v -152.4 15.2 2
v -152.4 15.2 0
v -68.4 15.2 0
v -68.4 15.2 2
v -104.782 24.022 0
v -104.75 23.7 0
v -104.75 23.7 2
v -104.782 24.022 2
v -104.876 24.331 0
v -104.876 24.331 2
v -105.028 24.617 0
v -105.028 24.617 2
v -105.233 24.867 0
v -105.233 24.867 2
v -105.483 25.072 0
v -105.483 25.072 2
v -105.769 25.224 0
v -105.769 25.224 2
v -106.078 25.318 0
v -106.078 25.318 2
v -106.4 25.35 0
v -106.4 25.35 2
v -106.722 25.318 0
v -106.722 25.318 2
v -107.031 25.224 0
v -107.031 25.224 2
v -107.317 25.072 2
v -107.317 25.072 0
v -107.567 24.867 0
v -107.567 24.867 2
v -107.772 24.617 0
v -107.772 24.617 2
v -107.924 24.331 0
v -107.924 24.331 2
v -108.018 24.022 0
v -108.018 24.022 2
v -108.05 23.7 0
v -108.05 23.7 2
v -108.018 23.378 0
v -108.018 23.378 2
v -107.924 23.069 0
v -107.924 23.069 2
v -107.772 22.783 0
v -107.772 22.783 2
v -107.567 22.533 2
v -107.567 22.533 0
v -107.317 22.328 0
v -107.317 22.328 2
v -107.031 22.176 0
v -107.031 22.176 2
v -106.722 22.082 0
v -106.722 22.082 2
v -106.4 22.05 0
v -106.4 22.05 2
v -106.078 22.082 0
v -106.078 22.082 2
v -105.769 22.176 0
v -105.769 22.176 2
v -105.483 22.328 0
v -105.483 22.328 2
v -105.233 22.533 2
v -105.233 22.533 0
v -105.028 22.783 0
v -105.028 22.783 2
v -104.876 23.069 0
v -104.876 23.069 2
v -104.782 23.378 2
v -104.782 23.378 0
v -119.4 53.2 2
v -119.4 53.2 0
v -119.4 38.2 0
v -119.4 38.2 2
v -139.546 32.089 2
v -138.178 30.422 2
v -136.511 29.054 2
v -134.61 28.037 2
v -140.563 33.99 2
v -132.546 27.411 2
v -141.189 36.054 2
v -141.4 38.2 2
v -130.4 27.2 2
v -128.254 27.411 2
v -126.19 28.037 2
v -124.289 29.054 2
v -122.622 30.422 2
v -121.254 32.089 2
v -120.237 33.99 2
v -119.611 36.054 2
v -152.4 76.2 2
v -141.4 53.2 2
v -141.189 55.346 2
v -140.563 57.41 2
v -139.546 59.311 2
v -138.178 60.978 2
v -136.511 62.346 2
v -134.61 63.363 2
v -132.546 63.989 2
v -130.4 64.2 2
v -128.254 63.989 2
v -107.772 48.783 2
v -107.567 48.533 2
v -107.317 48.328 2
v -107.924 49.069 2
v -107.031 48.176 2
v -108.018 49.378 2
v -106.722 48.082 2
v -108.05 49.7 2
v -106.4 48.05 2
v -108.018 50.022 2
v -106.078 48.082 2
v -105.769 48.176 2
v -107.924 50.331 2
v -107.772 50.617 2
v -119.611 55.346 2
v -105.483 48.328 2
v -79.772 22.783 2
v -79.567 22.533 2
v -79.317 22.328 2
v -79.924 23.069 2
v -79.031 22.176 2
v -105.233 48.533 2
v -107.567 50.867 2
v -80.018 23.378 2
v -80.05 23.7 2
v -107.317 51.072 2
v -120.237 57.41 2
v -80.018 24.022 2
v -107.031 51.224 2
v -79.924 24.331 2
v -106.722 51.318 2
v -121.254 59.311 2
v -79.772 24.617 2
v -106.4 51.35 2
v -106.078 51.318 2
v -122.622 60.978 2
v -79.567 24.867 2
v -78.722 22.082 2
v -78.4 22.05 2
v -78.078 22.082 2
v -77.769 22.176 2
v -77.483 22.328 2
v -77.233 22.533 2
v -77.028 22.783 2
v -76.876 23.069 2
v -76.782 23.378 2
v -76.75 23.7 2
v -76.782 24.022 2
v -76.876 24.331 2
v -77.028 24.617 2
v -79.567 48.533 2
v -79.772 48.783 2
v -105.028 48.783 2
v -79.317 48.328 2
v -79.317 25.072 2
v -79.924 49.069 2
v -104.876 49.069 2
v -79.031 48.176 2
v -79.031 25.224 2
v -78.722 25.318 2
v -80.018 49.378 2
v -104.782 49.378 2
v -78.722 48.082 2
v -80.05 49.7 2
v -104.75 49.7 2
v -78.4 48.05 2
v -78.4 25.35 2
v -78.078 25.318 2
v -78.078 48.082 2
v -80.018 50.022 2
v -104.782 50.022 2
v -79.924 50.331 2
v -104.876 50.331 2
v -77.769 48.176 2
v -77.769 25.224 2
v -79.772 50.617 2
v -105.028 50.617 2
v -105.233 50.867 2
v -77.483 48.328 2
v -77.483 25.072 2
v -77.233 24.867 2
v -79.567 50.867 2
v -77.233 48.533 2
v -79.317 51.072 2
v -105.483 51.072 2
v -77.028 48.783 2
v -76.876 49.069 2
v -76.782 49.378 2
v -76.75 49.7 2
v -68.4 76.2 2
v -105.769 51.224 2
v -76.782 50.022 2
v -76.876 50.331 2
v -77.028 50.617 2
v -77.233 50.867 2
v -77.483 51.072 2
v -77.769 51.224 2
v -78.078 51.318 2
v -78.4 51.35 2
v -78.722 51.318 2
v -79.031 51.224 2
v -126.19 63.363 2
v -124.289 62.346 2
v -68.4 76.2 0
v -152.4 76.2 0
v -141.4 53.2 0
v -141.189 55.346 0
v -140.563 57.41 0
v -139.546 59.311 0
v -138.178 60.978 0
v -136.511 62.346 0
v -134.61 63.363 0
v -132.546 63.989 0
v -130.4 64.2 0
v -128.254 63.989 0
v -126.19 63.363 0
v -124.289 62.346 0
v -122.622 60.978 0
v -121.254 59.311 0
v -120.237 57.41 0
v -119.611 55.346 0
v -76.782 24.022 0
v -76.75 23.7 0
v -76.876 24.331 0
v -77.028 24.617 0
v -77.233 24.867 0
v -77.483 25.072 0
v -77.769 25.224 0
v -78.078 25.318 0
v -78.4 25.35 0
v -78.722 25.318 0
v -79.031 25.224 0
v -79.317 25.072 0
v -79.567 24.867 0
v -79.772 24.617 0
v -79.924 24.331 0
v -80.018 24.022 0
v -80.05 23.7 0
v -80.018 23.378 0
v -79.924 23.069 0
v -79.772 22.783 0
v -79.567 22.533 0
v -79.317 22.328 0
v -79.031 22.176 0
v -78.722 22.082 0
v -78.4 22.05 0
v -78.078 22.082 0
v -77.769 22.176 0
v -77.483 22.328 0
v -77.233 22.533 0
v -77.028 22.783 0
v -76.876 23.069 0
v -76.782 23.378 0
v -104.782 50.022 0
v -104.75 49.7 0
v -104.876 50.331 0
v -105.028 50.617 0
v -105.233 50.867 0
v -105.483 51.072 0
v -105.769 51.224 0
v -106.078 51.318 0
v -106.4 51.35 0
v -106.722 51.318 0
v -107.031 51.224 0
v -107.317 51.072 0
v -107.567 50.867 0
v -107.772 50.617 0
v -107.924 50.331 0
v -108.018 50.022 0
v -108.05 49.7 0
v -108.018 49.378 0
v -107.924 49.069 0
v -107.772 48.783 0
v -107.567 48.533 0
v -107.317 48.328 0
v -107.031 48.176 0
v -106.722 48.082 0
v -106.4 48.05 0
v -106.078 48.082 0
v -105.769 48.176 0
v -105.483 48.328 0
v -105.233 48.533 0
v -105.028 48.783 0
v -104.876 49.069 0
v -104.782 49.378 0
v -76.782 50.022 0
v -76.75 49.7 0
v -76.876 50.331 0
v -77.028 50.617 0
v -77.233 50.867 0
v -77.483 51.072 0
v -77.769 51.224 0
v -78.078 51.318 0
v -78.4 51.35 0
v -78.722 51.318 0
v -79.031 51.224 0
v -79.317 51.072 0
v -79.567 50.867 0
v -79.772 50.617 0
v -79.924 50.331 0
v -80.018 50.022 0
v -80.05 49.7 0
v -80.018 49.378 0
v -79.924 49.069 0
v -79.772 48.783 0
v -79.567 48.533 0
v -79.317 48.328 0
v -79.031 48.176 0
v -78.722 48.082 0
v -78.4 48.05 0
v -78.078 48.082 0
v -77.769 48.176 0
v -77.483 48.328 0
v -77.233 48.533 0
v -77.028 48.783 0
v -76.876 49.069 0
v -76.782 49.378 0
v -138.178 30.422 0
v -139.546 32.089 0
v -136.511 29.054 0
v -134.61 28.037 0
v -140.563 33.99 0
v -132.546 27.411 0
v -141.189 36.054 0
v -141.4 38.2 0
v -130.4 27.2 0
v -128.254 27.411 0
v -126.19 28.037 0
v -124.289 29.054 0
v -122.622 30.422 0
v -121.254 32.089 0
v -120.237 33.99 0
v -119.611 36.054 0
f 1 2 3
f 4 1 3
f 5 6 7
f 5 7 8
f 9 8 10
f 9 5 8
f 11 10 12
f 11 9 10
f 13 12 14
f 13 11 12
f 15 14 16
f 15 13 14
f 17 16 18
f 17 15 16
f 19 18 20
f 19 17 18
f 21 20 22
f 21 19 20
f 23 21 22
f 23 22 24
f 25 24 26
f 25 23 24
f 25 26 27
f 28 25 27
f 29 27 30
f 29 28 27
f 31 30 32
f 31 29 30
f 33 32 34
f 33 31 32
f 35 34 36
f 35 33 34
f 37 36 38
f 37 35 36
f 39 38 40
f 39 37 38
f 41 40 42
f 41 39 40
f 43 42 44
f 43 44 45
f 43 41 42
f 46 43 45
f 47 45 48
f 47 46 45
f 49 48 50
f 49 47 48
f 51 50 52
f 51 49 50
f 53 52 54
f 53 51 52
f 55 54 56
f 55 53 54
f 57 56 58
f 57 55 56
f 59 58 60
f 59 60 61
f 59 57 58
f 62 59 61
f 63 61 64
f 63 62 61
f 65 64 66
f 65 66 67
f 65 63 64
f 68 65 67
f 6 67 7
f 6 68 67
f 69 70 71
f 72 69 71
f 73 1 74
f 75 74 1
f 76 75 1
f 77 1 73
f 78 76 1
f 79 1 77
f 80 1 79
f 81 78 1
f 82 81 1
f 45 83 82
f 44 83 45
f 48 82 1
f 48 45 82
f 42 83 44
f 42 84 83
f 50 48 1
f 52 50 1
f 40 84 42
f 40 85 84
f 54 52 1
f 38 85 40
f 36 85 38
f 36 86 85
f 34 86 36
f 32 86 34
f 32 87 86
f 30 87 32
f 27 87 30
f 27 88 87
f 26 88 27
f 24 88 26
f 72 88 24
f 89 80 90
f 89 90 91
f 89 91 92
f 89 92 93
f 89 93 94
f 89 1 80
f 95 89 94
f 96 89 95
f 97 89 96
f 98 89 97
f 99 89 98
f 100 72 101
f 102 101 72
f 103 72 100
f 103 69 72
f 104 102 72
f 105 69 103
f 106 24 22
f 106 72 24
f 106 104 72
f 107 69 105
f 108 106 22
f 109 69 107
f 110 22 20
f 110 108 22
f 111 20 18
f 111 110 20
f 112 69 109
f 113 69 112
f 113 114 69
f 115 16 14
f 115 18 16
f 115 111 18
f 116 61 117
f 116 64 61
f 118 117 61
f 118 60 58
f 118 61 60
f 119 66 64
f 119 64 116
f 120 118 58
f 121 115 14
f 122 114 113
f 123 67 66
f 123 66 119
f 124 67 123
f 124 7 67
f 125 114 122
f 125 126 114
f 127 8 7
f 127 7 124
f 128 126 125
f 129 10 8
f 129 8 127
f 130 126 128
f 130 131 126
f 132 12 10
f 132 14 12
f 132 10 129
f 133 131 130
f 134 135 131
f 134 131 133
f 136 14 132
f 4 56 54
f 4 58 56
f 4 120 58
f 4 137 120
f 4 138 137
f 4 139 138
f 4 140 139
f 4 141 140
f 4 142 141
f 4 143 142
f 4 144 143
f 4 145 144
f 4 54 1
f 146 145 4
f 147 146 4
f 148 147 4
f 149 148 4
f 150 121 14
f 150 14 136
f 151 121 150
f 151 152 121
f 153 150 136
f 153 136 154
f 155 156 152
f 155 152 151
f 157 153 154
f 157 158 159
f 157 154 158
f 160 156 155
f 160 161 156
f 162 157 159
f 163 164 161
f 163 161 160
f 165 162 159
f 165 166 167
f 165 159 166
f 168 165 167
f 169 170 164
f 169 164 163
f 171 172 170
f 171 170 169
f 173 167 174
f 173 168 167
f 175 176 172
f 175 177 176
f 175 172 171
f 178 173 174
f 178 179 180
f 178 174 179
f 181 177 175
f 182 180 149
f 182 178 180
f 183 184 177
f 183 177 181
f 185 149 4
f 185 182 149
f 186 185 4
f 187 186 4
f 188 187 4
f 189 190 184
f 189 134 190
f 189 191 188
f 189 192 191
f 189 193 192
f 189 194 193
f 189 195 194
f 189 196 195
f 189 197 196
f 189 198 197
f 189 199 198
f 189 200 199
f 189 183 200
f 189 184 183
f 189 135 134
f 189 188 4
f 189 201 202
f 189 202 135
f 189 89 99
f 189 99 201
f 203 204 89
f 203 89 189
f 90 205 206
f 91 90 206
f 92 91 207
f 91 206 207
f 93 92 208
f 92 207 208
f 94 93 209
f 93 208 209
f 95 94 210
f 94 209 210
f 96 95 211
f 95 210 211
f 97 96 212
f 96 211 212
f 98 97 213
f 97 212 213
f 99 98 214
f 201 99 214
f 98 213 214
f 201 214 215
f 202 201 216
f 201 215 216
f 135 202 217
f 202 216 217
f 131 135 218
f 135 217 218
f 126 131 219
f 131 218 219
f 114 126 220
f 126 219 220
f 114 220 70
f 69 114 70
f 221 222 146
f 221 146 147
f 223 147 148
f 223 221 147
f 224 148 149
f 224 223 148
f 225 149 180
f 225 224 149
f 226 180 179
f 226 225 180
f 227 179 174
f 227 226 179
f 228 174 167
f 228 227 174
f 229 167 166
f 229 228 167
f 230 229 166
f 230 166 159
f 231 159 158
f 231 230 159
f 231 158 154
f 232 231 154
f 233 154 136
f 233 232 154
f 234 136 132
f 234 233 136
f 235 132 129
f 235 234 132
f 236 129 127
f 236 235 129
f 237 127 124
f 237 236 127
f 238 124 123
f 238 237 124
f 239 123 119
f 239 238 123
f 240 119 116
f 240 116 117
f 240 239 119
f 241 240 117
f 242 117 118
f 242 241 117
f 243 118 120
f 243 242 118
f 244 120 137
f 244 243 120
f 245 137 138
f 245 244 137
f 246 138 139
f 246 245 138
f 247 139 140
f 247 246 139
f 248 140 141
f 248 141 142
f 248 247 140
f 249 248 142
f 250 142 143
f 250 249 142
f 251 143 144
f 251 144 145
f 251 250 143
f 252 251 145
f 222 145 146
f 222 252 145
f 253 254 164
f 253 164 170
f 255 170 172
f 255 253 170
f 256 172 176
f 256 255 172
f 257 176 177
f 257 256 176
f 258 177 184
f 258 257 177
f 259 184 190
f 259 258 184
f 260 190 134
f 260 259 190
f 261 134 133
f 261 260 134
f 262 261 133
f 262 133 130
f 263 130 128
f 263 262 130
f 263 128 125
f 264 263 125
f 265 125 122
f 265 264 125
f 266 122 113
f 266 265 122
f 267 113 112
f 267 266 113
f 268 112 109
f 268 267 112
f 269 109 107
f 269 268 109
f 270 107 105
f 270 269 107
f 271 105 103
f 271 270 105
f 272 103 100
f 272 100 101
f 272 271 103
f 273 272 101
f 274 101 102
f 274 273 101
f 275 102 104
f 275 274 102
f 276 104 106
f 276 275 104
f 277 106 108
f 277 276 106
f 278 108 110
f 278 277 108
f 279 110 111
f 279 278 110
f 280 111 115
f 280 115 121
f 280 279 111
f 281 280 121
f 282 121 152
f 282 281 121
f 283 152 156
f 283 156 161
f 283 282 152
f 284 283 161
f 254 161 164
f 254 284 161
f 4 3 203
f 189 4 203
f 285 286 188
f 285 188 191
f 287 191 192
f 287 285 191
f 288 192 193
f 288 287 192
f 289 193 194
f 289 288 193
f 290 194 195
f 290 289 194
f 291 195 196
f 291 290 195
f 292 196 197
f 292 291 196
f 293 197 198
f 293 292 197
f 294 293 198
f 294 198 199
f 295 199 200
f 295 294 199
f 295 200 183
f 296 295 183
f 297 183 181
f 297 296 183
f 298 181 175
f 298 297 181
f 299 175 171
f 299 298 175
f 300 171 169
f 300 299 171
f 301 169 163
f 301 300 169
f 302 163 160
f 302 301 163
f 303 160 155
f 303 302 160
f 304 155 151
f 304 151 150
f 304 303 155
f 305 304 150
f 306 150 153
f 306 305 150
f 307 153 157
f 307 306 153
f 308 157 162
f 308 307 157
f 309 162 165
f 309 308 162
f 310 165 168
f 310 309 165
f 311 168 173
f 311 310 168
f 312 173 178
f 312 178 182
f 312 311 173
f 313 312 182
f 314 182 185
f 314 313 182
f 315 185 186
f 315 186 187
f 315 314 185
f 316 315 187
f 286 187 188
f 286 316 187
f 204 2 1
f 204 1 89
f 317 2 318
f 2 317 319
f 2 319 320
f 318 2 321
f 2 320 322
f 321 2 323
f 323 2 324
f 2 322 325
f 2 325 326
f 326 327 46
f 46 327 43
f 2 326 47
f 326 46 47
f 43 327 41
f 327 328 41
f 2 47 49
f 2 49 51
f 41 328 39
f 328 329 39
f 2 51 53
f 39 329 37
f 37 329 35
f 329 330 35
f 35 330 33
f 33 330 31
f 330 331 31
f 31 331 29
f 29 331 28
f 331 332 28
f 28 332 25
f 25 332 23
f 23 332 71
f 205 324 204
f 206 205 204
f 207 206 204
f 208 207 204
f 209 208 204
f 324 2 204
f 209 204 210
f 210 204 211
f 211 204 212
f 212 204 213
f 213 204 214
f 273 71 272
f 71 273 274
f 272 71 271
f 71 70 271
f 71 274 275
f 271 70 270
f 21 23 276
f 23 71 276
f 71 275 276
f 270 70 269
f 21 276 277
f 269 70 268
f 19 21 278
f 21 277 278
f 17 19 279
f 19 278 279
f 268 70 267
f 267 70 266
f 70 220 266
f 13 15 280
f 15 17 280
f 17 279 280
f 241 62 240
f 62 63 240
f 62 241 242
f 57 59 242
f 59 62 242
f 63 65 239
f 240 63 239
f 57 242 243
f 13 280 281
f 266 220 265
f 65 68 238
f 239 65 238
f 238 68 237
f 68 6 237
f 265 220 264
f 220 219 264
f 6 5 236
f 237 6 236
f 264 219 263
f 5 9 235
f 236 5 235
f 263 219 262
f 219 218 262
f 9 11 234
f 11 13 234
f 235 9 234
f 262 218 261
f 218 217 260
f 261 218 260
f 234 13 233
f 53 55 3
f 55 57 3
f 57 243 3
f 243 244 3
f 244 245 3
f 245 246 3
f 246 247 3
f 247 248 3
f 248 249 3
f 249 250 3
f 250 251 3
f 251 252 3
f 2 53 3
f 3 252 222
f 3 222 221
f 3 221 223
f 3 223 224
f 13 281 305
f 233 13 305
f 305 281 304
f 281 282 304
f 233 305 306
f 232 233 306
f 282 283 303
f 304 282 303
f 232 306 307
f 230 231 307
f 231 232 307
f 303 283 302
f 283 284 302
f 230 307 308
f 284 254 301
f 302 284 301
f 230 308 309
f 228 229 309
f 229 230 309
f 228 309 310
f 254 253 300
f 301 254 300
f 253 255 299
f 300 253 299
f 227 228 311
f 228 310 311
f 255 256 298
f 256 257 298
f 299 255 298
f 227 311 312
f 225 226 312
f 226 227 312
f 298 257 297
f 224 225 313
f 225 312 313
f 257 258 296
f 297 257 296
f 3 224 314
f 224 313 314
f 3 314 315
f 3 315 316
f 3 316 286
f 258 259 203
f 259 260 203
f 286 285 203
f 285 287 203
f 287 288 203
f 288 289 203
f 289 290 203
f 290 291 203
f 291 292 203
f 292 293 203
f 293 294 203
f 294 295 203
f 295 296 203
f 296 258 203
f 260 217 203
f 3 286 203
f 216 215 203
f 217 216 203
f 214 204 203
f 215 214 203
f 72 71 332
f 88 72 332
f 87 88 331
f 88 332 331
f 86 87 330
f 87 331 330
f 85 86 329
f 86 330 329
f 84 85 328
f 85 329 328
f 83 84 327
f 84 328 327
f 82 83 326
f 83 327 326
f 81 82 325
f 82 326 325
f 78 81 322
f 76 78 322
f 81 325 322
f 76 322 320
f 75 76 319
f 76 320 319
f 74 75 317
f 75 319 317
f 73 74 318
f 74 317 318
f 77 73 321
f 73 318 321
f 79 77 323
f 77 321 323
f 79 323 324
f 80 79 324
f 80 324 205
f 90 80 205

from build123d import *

# Parameters (mm, degrees)
SKETCH1_W           = 84
SKETCH1_H           = 61
SKETCH1_R           = 1.65
BOSS_EXTRUDE1_DEPTH = 2


with BuildPart() as part:
    # Sketch1 → Boss-Extrude1 (new body)
    with BuildSketch(Plane.XY):
        with Locations((-110.4, 45.7)):
            Rectangle(SKETCH1_W, SKETCH1_H)
        with Locations((-106.4, 23.7)):
            Circle(SKETCH1_R, mode=Mode.SUBTRACT)
        with Locations((-78.4, 23.7)):
            Circle(SKETCH1_R, mode=Mode.SUBTRACT)
        with Locations((-78.4, 49.7)):
            Circle(SKETCH1_R, mode=Mode.SUBTRACT)
        with Locations((-106.4, 49.7)):
            Circle(SKETCH1_R, mode=Mode.SUBTRACT)
        with BuildLine():
            Line((-119.4, 53.2), (-119.4, 38.2))
            ThreePointArc((-119.4, 38.2), (-130.4, 27.2), (-141.4, 38.2))
            Line((-141.4, 38.2), (-141.4, 53.2))
            ThreePointArc((-141.4, 53.2), (-130.4, 64.2), (-119.4, 53.2))
        make_face(mode=Mode.SUBTRACT)
    extrude(amount=BOSS_EXTRUDE1_DEPTH)


solid = part.part
